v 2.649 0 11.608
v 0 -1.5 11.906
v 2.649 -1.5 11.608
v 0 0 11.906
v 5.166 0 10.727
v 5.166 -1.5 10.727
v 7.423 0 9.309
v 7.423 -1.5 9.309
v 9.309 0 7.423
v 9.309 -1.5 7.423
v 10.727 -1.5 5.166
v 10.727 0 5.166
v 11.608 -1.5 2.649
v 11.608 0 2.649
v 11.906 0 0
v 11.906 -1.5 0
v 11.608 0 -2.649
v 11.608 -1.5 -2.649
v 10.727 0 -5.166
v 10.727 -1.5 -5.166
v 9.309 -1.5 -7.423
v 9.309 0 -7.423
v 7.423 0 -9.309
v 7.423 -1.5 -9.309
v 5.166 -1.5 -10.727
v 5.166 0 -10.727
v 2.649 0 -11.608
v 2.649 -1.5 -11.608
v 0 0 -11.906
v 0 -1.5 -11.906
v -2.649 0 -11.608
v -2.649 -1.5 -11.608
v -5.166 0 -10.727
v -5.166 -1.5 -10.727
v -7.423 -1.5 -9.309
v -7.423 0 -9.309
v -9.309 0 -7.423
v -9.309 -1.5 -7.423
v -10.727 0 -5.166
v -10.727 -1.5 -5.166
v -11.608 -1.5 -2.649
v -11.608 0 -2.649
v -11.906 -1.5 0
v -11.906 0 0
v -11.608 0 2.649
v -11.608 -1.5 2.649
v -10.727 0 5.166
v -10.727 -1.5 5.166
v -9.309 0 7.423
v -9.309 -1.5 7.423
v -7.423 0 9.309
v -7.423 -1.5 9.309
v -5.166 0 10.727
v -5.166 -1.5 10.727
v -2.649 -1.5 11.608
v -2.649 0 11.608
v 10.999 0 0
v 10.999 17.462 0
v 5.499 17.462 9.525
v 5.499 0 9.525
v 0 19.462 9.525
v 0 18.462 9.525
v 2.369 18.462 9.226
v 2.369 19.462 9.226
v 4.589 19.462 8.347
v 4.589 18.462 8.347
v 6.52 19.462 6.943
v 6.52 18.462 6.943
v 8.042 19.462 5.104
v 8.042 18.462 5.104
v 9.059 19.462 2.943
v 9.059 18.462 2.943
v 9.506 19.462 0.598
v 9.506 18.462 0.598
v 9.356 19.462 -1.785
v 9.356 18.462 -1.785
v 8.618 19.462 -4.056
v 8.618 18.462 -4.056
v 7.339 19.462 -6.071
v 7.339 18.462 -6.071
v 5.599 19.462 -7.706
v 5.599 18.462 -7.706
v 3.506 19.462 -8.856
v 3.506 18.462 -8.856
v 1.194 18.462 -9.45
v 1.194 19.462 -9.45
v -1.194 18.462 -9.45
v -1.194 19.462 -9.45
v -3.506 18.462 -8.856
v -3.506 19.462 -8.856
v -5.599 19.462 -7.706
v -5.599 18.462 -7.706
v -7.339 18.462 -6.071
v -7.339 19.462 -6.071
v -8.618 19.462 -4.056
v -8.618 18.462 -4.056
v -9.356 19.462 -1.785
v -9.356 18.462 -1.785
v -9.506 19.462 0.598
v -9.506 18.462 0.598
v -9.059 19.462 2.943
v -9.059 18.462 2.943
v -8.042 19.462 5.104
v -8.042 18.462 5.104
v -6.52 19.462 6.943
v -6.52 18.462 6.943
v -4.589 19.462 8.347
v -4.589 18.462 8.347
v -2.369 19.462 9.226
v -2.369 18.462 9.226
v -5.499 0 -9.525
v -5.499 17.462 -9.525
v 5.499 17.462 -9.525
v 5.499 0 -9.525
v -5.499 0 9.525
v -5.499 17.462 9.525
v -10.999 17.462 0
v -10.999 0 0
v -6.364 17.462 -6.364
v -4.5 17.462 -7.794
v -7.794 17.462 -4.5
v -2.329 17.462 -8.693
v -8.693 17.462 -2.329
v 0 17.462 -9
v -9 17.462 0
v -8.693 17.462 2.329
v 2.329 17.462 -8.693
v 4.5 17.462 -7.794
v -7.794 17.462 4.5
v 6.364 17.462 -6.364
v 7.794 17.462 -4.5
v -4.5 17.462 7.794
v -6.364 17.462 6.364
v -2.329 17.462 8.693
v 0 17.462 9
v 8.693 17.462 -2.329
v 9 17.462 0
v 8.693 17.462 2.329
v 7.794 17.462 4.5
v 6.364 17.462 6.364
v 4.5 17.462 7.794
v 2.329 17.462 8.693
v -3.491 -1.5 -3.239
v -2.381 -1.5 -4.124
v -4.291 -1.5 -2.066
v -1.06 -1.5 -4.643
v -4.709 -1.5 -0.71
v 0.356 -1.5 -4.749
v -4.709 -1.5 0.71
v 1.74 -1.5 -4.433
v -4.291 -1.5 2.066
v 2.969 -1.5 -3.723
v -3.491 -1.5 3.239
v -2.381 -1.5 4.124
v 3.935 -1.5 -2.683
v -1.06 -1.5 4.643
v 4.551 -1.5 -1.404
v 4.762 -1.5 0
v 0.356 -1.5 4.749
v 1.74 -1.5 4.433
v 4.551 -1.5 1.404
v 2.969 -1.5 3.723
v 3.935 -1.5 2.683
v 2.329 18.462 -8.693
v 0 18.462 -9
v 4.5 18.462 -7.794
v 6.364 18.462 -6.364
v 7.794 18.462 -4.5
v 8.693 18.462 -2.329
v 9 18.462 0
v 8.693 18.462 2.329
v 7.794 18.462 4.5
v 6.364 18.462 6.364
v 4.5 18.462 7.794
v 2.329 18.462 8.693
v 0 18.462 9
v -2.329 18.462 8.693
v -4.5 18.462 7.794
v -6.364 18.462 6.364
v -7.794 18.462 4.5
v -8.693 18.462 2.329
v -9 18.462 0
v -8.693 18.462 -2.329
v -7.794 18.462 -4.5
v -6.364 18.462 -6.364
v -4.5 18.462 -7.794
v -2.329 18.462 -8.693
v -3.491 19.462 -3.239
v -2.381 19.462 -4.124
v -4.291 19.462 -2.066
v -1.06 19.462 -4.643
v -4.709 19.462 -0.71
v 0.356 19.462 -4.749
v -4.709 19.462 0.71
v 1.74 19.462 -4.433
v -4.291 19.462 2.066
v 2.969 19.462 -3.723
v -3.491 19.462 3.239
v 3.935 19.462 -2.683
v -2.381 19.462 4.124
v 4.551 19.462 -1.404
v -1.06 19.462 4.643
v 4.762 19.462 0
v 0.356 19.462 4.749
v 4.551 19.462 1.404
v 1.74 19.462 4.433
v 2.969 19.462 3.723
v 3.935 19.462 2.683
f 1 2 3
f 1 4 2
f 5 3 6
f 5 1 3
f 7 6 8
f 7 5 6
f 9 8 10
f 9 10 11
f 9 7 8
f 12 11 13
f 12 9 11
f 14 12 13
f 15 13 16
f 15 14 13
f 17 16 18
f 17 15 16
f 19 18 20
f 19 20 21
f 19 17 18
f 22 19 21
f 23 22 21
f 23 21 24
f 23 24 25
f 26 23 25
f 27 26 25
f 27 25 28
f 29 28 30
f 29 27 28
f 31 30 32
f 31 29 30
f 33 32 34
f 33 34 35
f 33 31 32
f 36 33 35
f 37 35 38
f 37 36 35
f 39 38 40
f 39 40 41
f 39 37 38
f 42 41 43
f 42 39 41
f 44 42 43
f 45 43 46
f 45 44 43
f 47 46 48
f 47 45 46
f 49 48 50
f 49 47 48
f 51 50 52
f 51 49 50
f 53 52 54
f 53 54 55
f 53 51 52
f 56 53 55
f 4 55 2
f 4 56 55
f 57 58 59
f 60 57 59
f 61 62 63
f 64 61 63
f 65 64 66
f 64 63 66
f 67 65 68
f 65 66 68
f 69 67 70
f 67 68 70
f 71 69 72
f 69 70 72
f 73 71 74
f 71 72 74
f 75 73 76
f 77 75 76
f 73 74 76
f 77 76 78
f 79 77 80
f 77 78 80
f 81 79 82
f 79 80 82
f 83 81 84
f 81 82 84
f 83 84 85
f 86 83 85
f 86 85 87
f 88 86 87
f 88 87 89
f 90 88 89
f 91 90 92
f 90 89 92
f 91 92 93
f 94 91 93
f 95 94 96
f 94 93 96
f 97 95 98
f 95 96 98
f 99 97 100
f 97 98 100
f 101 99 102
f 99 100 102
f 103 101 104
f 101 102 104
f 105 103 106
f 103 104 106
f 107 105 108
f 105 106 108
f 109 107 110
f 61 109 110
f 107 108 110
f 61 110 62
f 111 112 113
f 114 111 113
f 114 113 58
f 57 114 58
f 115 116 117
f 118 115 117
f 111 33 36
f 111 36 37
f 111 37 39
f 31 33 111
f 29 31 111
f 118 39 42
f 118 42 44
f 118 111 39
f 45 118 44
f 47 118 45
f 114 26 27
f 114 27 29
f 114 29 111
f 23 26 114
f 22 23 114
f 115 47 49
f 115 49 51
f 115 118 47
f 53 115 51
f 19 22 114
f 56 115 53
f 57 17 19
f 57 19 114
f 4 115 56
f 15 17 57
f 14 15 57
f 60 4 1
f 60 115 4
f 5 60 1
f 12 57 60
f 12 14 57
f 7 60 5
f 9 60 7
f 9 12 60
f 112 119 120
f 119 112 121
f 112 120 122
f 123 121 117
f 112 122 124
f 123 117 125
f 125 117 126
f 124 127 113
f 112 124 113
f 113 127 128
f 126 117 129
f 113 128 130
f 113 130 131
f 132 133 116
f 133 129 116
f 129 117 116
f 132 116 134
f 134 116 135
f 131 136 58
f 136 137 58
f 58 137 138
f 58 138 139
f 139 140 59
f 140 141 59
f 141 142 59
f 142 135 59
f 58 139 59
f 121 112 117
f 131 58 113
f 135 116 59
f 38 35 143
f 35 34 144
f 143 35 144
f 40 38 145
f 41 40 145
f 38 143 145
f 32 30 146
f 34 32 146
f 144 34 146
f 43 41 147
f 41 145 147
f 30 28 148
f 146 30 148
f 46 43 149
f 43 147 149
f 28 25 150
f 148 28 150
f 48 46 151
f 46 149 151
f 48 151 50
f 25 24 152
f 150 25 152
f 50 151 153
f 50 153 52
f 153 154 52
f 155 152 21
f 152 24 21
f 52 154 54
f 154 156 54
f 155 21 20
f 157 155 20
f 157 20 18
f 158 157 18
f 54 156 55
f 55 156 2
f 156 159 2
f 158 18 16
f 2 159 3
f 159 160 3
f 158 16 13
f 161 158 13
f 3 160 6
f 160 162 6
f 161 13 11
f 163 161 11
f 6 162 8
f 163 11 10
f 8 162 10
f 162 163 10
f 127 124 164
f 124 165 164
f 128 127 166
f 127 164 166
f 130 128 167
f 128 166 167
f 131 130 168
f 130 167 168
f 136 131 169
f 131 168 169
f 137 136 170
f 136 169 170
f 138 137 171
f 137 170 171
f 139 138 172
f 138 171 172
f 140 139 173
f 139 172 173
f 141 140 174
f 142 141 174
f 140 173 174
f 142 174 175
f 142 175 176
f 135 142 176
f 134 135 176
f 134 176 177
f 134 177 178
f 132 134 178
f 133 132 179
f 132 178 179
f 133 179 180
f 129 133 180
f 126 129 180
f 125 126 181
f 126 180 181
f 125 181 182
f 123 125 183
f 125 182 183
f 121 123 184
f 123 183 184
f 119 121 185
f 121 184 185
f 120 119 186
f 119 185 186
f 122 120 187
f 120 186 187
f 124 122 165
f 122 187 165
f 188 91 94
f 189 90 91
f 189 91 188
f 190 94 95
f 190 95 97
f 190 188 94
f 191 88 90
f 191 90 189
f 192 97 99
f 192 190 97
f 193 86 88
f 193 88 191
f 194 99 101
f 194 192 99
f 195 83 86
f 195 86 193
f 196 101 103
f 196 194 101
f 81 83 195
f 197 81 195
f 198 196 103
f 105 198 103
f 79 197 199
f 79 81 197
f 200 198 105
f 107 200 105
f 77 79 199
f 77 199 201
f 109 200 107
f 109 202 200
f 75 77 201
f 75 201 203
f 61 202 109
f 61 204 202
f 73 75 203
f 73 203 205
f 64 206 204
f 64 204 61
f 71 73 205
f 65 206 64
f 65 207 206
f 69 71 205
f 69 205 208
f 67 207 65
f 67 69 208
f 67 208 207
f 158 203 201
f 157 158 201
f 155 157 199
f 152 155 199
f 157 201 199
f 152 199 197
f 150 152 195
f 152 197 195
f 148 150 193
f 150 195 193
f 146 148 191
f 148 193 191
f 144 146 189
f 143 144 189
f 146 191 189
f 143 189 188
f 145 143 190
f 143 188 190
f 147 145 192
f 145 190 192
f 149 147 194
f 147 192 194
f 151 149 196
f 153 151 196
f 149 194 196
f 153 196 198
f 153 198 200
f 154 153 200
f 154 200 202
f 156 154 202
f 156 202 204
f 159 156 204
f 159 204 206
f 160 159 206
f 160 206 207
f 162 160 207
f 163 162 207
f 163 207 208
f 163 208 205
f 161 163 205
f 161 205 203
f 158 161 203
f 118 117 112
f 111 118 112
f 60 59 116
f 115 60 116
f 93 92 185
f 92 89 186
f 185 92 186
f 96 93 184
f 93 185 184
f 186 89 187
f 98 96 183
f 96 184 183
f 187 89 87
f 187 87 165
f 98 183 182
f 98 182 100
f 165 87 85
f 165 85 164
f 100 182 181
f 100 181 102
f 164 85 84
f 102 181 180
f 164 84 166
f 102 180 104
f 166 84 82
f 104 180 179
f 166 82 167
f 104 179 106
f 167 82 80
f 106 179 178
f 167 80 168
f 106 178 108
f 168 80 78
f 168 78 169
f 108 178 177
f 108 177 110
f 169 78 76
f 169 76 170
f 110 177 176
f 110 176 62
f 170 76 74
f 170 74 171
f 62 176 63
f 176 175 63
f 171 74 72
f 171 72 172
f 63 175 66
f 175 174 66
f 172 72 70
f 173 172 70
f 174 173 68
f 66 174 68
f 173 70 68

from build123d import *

# Parameters (mm, degrees)
SKETCH1_W            = 11.90625
SKETCH1_H            = 1.5
BOSS_EXTRUDE1_DEPTH  = 17.4625
SKETCH3_W            = 9
SKETCH3_H            = 1
SKETCH6_R            = 9.525
BOSS_EXTRUDE2_DEPTH  = 1
M8_CLEARANCE_HOLE1_D = 9.525


with BuildPart() as part:
    # Sketch1 → Revolve1 (revolve)
    with BuildSketch(Plane(origin=(0, 0, 0), x_dir=(-1, 0, 0), z_dir=(0, 0, -1)), mode=Mode.PRIVATE) as revolve1_sk:
        with Locations((-5.953125, -0.75)):
            Rectangle(SKETCH1_W, SKETCH1_H)
    revolve(revolve1_sk.sketch.rotate(Axis((0, -1.5, 0), (0, 1, 0)), 270), axis=Axis((0, -1.5, 0), (0, 1, 0)))

    # Sketch2 → Boss-Extrude1 (add)
    with BuildSketch(Plane(origin=(0, 0, 0), x_dir=(-1, 0, 0), z_dir=(0, 1, 0))):
        Polygon((10.998522628, 0), (5.499261314, -9.525), (-5.499261314, -9.525), (-10.998522628, 0), (-5.499261314, 9.525), (5.499261314, 9.525), align=None)
    extrude(amount=BOSS_EXTRUDE1_DEPTH)

    # Sketch3 → Revolve2 (revolve)
    with BuildSketch(Plane.XY, mode=Mode.PRIVATE) as revolve2_sk:
        with Locations((4.5, 17.9625)):
            Rectangle(SKETCH3_W, SKETCH3_H)
    revolve(revolve2_sk.sketch.rotate(Axis((0, 18.4625, 0), (0, -1, 0)), 270), axis=Axis((0, 18.4625, 0), (0, -1, 0)))

    # Sketch6 → Boss-Extrude2 (add)
    with BuildSketch(Plane(origin=(0, 18.4625, 0), x_dir=(1, 0, 0), z_dir=(0, 1, 0))):
        with Locations(Location((0, 0, 0), (0, 0, 270))):
            Circle(SKETCH6_R)
    extrude(amount=BOSS_EXTRUDE2_DEPTH)

    # M8 Clearance Hole1 (through all)
    with Locations(Plane(origin=(0, -1.5, 0), x_dir=(-1, 0, 0), z_dir=(0, -1, 0))):
        with Locations((0, 0)):
            Hole(M8_CLEARANCE_HOLE1_D / 2)


solid = part.part
